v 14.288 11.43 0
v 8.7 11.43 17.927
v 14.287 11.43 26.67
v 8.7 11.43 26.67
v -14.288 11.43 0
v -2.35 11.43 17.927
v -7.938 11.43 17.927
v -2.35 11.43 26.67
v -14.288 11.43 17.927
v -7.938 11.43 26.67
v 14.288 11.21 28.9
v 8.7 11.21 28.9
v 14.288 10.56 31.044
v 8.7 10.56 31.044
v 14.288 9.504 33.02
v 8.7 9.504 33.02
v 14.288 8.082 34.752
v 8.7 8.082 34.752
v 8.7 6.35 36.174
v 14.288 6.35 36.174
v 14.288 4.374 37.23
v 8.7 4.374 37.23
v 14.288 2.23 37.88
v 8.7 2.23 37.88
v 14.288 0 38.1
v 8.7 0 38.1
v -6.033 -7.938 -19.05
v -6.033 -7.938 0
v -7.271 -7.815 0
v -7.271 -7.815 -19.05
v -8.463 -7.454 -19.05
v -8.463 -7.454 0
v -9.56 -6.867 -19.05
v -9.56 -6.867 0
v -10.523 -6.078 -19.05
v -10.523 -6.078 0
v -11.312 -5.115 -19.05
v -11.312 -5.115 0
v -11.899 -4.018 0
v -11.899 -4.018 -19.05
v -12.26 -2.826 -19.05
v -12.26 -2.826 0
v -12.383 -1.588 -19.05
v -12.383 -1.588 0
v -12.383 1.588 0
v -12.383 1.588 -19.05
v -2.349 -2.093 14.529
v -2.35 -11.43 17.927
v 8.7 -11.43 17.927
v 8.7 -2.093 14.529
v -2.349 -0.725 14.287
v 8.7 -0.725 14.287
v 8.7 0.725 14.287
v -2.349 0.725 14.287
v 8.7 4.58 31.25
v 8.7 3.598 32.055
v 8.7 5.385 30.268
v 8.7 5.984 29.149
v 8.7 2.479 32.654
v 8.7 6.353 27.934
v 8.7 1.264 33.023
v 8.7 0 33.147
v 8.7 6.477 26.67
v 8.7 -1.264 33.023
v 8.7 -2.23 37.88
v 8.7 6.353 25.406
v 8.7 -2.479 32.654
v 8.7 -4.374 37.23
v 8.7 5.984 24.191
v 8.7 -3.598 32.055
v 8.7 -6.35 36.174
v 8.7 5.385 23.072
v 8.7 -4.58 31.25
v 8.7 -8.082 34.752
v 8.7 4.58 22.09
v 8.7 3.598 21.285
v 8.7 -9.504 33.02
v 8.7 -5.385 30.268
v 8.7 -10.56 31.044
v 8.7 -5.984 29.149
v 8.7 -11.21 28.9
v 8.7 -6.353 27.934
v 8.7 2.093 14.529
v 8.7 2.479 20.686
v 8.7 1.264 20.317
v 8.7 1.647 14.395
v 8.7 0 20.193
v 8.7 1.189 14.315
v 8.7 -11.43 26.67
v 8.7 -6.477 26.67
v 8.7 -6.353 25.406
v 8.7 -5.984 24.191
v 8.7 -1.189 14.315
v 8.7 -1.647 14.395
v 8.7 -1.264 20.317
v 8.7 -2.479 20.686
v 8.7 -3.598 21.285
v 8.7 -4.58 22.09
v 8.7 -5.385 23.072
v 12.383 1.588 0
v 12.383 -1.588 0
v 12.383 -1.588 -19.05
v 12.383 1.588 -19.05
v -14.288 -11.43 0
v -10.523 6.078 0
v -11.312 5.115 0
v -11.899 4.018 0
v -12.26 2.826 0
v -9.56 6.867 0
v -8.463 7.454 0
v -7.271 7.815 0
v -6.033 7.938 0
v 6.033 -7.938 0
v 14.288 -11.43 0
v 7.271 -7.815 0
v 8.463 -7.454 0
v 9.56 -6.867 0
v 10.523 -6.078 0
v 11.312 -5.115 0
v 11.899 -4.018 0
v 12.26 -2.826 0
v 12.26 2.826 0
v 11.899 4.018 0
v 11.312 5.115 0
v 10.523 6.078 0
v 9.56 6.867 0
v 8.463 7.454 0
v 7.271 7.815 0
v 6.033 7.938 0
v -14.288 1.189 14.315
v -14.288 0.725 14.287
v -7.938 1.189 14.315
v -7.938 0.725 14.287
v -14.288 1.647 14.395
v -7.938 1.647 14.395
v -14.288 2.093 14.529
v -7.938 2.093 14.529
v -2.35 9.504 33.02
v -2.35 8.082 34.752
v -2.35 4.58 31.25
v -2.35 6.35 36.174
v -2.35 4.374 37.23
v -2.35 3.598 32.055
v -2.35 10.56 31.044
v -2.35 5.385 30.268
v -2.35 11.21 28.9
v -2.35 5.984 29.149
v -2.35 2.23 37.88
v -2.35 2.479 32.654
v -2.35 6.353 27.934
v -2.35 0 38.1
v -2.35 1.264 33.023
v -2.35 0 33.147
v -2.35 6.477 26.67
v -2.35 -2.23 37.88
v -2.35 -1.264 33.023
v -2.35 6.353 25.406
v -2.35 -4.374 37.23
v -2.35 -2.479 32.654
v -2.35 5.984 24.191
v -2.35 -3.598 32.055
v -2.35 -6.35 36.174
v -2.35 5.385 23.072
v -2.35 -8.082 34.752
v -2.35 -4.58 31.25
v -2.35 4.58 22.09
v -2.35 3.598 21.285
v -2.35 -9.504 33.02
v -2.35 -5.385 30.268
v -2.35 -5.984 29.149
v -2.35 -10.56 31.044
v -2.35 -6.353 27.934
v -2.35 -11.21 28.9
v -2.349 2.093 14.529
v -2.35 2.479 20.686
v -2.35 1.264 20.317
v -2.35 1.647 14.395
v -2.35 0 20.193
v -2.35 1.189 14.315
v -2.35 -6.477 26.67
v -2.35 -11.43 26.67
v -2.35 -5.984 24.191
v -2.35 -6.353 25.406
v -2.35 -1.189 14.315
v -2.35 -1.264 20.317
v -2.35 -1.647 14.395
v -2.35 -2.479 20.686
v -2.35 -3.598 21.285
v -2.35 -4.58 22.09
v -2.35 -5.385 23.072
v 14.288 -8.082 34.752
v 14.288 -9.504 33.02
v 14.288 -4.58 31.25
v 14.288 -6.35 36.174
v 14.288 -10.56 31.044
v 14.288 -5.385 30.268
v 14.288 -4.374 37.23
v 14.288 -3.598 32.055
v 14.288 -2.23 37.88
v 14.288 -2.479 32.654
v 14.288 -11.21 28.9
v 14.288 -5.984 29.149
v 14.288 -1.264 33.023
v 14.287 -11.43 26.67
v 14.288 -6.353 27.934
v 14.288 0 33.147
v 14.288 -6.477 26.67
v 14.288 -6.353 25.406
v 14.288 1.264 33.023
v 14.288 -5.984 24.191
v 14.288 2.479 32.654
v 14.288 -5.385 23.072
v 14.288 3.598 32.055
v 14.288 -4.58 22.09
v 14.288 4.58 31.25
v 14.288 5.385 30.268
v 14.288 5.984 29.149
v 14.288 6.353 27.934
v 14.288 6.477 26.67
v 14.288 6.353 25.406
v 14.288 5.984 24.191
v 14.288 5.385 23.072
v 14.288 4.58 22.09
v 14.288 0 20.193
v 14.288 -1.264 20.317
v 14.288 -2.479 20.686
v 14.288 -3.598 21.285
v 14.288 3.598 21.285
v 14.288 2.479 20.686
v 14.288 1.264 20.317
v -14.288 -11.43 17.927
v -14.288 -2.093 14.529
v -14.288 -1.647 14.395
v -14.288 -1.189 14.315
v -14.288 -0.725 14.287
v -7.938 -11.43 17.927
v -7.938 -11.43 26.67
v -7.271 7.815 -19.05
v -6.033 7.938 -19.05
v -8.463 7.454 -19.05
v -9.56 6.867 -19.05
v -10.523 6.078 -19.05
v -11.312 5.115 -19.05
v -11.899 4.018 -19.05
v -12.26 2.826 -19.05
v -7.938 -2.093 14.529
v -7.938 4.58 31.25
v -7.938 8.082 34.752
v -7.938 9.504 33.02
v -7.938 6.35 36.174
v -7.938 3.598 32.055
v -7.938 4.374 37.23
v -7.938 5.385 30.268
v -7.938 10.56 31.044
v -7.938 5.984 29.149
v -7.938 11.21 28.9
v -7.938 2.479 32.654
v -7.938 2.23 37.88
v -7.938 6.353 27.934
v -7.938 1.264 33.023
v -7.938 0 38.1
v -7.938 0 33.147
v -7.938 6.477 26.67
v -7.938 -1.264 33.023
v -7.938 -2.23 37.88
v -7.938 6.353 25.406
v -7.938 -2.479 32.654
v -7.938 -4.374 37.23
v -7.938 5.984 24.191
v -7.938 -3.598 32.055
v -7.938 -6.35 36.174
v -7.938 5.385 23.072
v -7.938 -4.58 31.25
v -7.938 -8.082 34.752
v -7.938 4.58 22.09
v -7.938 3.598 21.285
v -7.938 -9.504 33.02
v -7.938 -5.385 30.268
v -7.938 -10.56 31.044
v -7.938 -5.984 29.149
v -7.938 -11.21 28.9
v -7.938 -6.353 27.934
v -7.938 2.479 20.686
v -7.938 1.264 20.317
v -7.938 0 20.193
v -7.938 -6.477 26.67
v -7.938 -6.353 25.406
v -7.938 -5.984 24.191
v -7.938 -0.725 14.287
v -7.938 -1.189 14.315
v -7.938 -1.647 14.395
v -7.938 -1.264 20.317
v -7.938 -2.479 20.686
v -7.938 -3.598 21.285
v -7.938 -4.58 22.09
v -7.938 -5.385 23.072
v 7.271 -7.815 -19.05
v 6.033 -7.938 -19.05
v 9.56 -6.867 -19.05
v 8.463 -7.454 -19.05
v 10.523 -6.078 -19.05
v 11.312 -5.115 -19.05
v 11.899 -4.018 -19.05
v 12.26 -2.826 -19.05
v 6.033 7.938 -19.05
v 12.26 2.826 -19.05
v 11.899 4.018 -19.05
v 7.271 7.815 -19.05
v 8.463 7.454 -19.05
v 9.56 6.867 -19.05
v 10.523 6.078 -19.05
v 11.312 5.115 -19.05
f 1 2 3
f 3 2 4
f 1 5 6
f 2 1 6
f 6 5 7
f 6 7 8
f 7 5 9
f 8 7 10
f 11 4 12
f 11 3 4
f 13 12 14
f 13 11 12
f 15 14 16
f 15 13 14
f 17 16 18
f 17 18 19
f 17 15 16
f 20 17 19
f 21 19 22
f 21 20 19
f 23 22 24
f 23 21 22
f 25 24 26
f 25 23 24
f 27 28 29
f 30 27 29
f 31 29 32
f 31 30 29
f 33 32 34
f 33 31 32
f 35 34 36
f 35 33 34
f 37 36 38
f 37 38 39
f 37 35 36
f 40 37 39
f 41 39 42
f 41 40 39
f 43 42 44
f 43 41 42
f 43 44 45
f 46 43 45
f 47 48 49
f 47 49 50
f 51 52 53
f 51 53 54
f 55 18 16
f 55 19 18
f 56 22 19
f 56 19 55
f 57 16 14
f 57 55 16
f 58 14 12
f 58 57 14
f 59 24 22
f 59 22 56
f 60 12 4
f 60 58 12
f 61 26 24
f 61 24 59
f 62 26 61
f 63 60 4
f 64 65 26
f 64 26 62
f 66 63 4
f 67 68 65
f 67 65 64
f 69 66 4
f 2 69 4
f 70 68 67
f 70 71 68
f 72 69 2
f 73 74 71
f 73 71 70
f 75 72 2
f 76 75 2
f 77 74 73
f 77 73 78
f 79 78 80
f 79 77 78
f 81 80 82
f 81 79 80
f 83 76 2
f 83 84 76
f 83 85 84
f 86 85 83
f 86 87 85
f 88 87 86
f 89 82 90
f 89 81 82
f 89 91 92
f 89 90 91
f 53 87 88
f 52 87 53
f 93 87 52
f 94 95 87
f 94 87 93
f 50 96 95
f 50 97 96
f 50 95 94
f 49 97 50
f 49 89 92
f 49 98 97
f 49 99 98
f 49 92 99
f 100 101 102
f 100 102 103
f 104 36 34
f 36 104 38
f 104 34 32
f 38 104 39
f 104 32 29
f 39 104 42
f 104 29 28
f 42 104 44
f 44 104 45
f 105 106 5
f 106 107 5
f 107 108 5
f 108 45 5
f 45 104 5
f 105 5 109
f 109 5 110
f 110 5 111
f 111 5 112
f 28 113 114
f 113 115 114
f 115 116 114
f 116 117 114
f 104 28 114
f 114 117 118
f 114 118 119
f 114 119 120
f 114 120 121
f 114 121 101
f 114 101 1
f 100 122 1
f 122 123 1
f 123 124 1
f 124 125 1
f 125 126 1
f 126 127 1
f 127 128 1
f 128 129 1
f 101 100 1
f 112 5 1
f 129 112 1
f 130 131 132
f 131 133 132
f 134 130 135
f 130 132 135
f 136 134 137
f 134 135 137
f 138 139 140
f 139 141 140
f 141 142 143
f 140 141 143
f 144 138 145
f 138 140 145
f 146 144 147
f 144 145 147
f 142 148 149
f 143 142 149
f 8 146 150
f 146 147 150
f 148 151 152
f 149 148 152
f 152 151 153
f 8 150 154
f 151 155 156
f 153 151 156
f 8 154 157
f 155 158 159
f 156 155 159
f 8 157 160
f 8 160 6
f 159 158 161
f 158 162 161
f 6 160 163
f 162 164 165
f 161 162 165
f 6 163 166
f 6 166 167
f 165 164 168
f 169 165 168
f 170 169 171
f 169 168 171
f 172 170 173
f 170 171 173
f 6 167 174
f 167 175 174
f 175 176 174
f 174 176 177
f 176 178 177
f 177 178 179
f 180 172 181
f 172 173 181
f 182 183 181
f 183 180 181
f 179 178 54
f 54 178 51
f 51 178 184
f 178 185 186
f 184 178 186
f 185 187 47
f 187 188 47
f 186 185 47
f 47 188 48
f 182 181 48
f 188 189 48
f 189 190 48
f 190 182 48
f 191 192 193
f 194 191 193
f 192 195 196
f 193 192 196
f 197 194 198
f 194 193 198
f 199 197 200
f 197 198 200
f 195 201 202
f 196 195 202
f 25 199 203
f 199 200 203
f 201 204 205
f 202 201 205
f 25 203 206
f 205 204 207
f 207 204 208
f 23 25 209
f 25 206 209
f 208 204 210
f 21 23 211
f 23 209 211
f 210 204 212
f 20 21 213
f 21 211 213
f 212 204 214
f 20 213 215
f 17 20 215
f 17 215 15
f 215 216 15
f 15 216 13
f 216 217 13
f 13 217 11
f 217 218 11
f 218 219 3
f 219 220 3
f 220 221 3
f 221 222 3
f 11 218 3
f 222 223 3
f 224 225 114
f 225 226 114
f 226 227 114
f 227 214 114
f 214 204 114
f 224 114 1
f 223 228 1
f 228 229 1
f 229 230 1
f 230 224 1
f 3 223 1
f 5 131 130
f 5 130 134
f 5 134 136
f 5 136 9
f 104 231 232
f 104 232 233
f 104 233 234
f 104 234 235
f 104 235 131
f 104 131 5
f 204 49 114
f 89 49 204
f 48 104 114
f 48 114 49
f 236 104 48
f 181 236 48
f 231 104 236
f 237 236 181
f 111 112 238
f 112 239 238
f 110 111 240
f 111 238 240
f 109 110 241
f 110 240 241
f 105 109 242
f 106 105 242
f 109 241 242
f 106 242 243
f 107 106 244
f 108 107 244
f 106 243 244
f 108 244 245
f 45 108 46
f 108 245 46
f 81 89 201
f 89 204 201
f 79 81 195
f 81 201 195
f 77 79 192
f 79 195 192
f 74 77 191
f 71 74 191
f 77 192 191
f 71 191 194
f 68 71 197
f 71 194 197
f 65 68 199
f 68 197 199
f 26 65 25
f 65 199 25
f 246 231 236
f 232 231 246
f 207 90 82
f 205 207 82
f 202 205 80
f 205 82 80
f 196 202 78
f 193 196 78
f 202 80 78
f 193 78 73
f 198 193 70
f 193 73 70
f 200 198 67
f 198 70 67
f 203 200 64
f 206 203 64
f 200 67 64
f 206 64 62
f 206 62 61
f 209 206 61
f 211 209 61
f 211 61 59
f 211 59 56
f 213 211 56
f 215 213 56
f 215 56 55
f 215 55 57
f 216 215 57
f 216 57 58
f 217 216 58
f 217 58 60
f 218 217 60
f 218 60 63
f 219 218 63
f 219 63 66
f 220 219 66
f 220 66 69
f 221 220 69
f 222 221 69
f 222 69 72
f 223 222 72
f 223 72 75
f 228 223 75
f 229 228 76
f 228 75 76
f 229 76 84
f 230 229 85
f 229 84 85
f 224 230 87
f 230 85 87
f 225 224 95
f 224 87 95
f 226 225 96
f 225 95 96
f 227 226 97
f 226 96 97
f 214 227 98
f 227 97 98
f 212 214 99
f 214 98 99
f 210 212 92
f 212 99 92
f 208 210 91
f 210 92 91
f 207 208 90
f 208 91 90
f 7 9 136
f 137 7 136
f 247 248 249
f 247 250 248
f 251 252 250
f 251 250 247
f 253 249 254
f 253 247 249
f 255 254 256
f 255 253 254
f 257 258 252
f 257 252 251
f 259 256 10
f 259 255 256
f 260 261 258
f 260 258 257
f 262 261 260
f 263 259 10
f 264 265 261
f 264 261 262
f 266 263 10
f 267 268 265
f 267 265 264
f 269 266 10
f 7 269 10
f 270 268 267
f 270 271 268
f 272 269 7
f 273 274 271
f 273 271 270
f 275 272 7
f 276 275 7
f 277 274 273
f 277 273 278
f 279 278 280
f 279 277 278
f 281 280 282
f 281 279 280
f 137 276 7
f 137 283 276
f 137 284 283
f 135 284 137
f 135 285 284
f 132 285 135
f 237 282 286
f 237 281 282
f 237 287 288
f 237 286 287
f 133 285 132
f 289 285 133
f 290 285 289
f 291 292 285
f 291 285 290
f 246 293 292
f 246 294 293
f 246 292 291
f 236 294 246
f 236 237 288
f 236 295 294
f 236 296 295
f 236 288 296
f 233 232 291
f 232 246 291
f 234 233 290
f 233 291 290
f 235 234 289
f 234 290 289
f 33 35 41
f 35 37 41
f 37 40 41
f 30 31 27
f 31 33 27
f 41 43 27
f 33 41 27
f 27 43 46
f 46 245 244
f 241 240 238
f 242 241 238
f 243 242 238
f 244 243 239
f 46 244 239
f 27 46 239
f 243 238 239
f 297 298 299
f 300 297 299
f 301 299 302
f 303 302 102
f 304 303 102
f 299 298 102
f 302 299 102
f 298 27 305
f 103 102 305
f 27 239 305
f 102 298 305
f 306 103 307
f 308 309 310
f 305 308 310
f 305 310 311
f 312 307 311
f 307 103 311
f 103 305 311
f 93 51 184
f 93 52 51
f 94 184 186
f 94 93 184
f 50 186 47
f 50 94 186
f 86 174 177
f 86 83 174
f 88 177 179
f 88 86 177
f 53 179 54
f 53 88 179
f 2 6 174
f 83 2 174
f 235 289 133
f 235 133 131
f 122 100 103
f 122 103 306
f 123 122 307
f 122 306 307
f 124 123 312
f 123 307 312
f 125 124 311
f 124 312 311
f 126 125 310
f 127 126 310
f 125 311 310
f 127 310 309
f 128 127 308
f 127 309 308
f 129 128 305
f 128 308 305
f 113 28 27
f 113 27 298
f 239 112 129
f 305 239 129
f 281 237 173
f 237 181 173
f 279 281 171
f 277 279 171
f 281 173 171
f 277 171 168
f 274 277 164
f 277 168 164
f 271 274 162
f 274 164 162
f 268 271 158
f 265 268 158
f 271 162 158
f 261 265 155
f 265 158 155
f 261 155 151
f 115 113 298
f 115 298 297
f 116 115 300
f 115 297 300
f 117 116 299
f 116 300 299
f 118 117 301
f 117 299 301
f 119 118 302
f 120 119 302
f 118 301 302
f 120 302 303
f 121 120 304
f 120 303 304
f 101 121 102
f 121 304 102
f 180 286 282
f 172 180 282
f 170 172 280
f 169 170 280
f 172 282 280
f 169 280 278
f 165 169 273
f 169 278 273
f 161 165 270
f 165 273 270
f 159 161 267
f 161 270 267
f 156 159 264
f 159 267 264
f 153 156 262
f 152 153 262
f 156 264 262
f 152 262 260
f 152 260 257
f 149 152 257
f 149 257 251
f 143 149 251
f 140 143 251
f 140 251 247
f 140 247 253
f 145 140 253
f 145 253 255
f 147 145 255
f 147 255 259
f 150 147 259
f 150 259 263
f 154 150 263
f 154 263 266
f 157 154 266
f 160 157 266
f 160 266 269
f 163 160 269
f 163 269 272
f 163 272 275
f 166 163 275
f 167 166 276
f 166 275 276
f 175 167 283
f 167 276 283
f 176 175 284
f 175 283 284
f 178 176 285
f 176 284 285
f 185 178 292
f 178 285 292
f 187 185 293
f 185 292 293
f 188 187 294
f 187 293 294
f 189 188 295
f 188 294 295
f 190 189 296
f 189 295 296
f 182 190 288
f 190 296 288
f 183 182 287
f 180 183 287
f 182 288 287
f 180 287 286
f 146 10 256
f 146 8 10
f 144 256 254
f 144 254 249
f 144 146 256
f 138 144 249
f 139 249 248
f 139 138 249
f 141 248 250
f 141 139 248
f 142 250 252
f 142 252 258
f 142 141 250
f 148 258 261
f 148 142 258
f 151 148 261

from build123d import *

# Parameters (mm, degrees)
SKETCH2_W           = 24.765
SKETCH2_H           = 15.875
BOSS_EXTRUDE1_DEPTH = 19.05
SKETCH3_W           = 28.575
SKETCH3_H           = 22.86
BOSS_EXTRUDE2_DEPTH = 38.1
SKETCH4_W           = 6.35
SKETCH4_H           = 23.8125
SKETCH4_W_2         = 11.049
CUT_EXTRUDE1_DEPTH  = 47.6725
FILLET5_R           = 11.43
SKETCH7_R           = 6.477
CUT_EXTRUDE3_DEPTH  = 46.56539833
FILLET3_R           = 6.35
BOSS_EXTRU_1_REACH  = 50.977
CONG_3_R            = 4


with BuildPart() as part:
    # Sketch2 → Boss-Extrude1 (new body)
    with BuildSketch(Plane.XY):
        Rectangle(SKETCH2_W, SKETCH2_H)
    extrude(amount=-BOSS_EXTRUDE1_DEPTH)

    # Sketch3 → Boss-Extrude2 (add)
    with BuildSketch(Plane.XY):
        Rectangle(SKETCH3_W, SKETCH3_H)
    extrude(amount=BOSS_EXTRUDE2_DEPTH)

    # Sketch4 → Cut-Extrude1 (cut, through all)
    with BuildSketch(Plane(origin=(0, -11.43, 0), x_dir=(-1, 0, 0), z_dir=(0, -1, 0))):
        with Locations((11.1125, -26.19375)):
            Rectangle(SKETCH4_W, SKETCH4_H)
        with Locations((-3.175, -26.19375)):
            Rectangle(SKETCH4_W_2, SKETCH4_H)
    extrude(amount=-CUT_EXTRUDE1_DEPTH, mode=Mode.SUBTRACT)

    # Fillet5
    fillet5_edges = [part.edges().sort_by_distance(p)[0] for p in [
        (-5.1435, -11.43, 38.1),
        (-5.1435, 11.43, 38.1),
        (11.4935, 11.43, 38.1),
        (11.4935, -11.43, 38.1),
    ]]
    fillet(fillet5_edges, radius=FILLET5_R - 0.0001)  # a hair under: the kernel refuses the full size

    # Sketch7 → Cut-Extrude3 (cut, through all)
    with BuildSketch(Plane.ZY.offset(7.9375)):
        with Locations(Location((26.67, 0, 0), (0, 0, 270))):
            Circle(SKETCH7_R)
    extrude(amount=-CUT_EXTRUDE3_DEPTH, mode=Mode.SUBTRACT)

    # Fillet3
    fillet3_edges = [part.edges().sort_by_distance(p)[0] for p in [
        (-12.3825, 7.9375, -9.525),
        (12.3825, 7.9375, -9.525),
        (12.3825, -7.9375, -9.525),
        (-12.3825, -7.9375, -9.525),
    ]]
    fillet(fillet3_edges, radius=FILLET3_R)

    # Boss.-Extru.1: up to this face of the body (flat: up to its plane)
    boss_extru_1_end = Plane(part.part.faces().sort_by_distance((14.2875, 0, 16.22567269))[0])
    # Esquisse1 → Boss.-Extru.1 (add, up to the picked face)
    with BuildSketch(Plane.ZY.offset(14.2875), mode=Mode.PRIVATE) as boss_extru_1_sk1:
        Polygon((14.2875, 11.43), (17.927202343, 11.43), (14.2875, 1.43), align=None)
    boss_extru_1_tool1 = split(extrude(boss_extru_1_sk1.sketch, amount=-BOSS_EXTRU_1_REACH, mode=Mode.PRIVATE), bisect_by=boss_extru_1_end, keep=Keep.BOTH, mode=Mode.PRIVATE)
    boss_extru_1 = boss_extru_1_tool1.solids().sort_by(Axis((-14.2875, 8.096667, 15.500734), (1, 0, 0)))[0]
    add(boss_extru_1)

    # Symétrie1: Boss.-Extru.1 across plane
    add(boss_extru_1.mirror(Plane.ZX))

    # Congé3
    cong_3_edges = [part.edges().sort_by_distance(p)[0] for p in [
        (-11.1125, 1.43, 14.2875),
        (3.175, 1.43, 14.2875),
        (-11.1125, -1.43, 14.2875),
        (3.175, -1.43, 14.2875),
    ]]
    fillet(cong_3_edges, radius=CONG_3_R)


solid = part.part
